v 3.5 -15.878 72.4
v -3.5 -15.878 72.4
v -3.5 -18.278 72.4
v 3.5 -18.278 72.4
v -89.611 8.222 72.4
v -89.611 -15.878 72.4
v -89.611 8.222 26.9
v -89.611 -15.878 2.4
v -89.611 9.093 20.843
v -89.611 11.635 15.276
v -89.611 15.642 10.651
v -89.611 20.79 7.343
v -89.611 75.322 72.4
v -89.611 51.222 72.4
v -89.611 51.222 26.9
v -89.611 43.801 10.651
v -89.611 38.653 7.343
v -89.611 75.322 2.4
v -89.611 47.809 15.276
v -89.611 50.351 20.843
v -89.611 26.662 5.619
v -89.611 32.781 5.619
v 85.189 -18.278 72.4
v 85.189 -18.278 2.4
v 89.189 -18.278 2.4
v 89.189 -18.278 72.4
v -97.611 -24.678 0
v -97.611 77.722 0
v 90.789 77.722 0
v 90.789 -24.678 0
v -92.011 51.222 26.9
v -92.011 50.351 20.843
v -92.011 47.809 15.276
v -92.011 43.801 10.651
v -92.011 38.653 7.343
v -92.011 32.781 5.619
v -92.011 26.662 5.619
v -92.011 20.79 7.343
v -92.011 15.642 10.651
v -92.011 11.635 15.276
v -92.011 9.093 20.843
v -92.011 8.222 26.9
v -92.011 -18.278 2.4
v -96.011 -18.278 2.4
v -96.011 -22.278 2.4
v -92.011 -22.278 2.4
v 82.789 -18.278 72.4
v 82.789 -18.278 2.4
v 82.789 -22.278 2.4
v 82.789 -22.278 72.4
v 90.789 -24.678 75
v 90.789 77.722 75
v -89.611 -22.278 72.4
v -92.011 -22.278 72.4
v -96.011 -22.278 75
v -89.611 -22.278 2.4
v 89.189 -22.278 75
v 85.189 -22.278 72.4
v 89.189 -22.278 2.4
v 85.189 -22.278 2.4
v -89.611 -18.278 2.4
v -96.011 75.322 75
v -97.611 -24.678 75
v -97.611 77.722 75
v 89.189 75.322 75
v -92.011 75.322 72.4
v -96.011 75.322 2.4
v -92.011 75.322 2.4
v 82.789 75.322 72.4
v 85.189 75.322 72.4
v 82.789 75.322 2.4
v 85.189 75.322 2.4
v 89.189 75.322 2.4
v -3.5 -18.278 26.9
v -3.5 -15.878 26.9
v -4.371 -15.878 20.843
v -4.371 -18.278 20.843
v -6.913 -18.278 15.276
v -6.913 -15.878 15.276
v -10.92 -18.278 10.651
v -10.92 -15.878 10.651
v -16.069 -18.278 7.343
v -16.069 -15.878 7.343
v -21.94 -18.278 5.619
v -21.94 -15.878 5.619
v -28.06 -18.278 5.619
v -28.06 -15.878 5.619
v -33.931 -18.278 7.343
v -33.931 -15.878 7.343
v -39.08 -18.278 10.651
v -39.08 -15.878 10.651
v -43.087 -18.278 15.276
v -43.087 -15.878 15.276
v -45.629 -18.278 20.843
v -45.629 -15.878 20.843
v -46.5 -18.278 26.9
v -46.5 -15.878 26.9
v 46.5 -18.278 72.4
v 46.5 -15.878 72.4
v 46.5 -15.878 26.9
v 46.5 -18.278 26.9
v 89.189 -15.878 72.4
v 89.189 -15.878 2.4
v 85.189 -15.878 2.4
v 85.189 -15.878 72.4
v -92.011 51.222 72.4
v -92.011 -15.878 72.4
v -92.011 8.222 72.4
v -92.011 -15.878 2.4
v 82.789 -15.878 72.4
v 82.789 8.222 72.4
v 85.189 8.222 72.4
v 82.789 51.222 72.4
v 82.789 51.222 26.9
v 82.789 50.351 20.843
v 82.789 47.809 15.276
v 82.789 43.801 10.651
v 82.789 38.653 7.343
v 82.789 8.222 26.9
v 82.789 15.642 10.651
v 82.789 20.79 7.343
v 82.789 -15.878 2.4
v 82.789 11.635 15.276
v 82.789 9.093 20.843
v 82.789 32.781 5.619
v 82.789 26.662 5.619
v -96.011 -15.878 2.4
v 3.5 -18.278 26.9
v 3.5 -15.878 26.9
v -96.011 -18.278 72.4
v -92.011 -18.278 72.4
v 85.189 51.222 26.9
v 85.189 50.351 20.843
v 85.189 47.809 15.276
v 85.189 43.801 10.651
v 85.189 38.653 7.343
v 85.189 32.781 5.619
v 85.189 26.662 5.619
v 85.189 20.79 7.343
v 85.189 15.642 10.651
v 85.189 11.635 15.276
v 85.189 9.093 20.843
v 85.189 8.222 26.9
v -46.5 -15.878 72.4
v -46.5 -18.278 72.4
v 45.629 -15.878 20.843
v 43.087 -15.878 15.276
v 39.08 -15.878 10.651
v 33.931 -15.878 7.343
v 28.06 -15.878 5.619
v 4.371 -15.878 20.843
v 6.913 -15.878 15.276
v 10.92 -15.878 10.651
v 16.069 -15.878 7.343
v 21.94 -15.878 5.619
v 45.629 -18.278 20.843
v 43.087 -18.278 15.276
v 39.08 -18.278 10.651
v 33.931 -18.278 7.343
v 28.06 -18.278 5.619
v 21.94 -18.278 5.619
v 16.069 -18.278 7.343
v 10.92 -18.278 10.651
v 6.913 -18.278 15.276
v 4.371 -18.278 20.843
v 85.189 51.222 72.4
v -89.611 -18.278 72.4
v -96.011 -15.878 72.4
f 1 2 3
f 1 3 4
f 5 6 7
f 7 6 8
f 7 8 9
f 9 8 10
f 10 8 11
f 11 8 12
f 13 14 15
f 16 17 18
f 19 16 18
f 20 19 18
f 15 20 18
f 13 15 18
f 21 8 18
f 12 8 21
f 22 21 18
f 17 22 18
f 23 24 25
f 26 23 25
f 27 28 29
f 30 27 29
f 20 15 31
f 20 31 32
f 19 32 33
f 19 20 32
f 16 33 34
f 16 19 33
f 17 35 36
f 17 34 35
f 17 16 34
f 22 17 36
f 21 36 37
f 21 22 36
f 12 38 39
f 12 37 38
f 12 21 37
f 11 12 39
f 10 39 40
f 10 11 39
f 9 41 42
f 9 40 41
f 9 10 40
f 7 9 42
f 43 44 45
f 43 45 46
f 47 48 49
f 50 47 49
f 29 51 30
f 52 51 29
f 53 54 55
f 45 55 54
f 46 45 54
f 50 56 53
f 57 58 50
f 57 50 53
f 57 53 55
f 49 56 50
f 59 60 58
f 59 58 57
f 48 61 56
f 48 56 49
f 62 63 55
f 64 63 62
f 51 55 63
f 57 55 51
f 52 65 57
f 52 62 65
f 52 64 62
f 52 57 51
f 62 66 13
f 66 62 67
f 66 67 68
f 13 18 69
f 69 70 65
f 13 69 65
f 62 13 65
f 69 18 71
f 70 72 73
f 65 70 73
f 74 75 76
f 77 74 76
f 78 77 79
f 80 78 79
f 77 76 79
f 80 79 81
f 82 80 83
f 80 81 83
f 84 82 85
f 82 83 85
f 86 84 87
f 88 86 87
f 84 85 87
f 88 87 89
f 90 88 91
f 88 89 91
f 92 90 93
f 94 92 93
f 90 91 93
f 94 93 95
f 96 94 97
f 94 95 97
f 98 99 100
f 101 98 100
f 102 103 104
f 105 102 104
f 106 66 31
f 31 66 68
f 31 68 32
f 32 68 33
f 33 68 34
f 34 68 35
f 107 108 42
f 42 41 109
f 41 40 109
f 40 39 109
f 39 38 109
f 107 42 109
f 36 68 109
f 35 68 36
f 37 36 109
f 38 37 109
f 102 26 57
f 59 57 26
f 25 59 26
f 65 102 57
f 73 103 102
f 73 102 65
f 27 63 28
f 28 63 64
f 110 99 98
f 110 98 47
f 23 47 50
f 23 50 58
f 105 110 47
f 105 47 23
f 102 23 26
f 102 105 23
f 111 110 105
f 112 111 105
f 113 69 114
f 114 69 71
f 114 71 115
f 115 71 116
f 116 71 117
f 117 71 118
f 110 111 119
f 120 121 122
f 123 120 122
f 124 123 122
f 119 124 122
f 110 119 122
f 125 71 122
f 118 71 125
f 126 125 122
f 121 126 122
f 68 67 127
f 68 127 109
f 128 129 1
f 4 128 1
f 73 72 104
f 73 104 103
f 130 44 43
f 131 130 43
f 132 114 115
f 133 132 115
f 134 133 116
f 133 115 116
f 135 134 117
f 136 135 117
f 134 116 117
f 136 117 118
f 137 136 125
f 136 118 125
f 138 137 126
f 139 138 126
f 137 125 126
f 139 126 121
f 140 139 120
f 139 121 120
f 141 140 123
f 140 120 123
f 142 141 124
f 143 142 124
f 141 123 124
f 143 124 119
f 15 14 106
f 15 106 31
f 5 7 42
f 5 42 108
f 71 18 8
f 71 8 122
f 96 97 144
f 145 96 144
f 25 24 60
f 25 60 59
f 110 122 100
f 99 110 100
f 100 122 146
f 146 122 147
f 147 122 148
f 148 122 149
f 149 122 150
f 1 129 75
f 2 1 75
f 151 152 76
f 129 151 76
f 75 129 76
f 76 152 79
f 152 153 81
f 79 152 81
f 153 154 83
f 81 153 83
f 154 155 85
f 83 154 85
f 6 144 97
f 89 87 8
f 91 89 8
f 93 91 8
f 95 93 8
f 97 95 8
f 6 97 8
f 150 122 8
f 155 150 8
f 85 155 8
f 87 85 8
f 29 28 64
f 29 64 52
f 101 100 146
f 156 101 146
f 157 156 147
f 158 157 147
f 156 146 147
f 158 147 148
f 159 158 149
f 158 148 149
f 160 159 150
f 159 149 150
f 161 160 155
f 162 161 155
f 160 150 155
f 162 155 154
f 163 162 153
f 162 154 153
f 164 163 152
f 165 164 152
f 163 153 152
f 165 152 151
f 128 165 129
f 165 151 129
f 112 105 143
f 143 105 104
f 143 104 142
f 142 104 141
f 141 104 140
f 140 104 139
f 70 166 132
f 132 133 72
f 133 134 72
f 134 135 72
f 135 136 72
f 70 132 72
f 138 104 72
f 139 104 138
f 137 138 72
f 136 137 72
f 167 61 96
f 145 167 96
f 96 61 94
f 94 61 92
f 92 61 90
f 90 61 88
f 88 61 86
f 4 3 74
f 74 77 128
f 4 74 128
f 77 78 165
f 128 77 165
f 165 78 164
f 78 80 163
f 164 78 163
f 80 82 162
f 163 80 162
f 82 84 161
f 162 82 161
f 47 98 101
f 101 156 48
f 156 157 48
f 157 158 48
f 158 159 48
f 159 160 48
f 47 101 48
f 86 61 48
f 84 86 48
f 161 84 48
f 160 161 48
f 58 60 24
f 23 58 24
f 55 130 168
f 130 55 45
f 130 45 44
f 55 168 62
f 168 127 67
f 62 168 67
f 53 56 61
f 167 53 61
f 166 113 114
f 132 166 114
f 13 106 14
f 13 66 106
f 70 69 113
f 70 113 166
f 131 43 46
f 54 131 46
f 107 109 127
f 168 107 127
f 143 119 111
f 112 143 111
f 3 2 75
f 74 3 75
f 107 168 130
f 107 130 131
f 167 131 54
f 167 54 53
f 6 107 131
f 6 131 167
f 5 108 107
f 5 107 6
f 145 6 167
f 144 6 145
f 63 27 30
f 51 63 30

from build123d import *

# Parameters (mm, degrees)
F0_W      = 190
F0_H      = 102.4
F1_DEPTH  = 75
F2_T      = -2.4
F4_DEPTH  = 70
F6_DEPTH  = 2.6
F7_DEPTH  = 176.9
F9_DEPTH  = 2.6
F10_W     = 0.8
F10_H     = 102.4
F11_DEPTH = 75


with BuildPart() as f1:
    # F0 (on Top) → F1 (new body)
    with BuildSketch(Plane.XY):
        with Locations((-3.4108273685, 26.5216542304)):
            Rectangle(F0_W, F0_H)
    extrude(amount=F1_DEPTH)

    # F2
    f2_openings = [f1.faces().sort_by_distance(p)[0] for p in [
        (-3.410827, 26.521654, 75),
    ]]
    offset(amount=F2_T, openings=f2_openings)

    # F3 (on face) → F4 (join)
    with BuildSketch(Plane.XY.offset(2.4)):
        Polygon((-89.6108273685, 75.3216542304), (-92.0108273685, 75.3216542304), (-92.0108273685, -15.8783457696), (-96.0108273685, -15.8783457696), (-96.0108273685, -18.2783457696), (-92.0108273685, -18.2783457696), (-92.0108273685, -22.2783457696), (-89.6108273685, -22.2783457696), (-89.6108273685, -18.2783457696), (82.7891726315, -18.2783457696), (82.7891726315, -22.2783457696), (85.1891726315, -22.2783457696), (85.1891726315, -18.2783457696), (89.1891726315, -18.2783457696), (89.1891726315, -15.8783457696), (85.1891726315, -15.8783457696), (85.1891726315, 75.3216542304), (82.7891726315, 75.3216542304), (82.7891726315, -15.8783457696), (-89.6108273685, -15.8783457696), align=None)
    extrude(amount=F4_DEPTH)

    # F5 (on face) → F6 (cut)
    with BuildSketch(Plane(origin=(82.7891726315, 0, 0), x_dir=(0, -1, 0), z_dir=(-1, 0, 0))):
        with BuildLine():
            Line((-51.2216542304, 72.4), (-51.2216542304, 26.9))
            ThreePointArc((-51.2216542304, 26.9), (-29.7216542304, 5.4), (-8.2216542304, 26.9))
            Line((-8.2216542304, 26.9), (-8.2216542304, 72.4))
            Line((-8.2216542304, 72.4), (-51.2216542304, 72.4))
        make_face()
    extrude(amount=-F6_DEPTH, mode=Mode.SUBTRACT)

    # F5 (on face) → F7 (cut)
    with BuildSketch(Plane(origin=(82.7891726315, 0, 0), x_dir=(0, -1, 0), z_dir=(-1, 0, 0))):
        with BuildLine():
            Line((-51.2216542304, 72.4), (-51.2216542304, 26.9))
            ThreePointArc((-51.2216542304, 26.9), (-29.7216542304, 5.4), (-8.2216542304, 26.9))
            Line((-8.2216542304, 26.9), (-8.2216542304, 72.4))
            Line((-8.2216542304, 72.4), (-51.2216542304, 72.4))
        make_face()
    extrude(amount=F7_DEPTH, mode=Mode.SUBTRACT)

    # F8 (on face) → F9 (cut)
    with BuildSketch(Plane(origin=(0, -15.8783457696, 0), x_dir=(-1, 0, 0), z_dir=(0, 1, 0))):
        with BuildLine():
            Line((3.5, 72.4), (3.5, 26.9))
            ThreePointArc((3.5, 26.9), (25, 5.4), (46.5, 26.9))
            Line((46.5, 26.9), (46.5, 72.4))
            Line((46.5, 72.4), (3.5, 72.4))
        make_face()
        with BuildLine():
            Line((-46.5, 72.4), (-46.5, 26.9))
            ThreePointArc((-46.5, 26.9), (-25, 5.4), (-3.5, 26.9))
            Line((-3.5, 26.9), (-3.5, 72.4))
            Line((-3.5, 72.4), (-46.5, 72.4))
        make_face()
    extrude(amount=-F9_DEPTH, mode=Mode.SUBTRACT)

    # F10 (on face) → F11 (cut)
    with BuildSketch(Plane.XY.offset(75)):
        with Locations((-98.0108273685, 26.5216542304)):
            Rectangle(F10_W, F10_H)
        with Locations((91.1891726315, 26.5216542304)):
            Rectangle(F10_W, F10_H)
    extrude(amount=-F11_DEPTH, mode=Mode.SUBTRACT)


solid = f1.part
